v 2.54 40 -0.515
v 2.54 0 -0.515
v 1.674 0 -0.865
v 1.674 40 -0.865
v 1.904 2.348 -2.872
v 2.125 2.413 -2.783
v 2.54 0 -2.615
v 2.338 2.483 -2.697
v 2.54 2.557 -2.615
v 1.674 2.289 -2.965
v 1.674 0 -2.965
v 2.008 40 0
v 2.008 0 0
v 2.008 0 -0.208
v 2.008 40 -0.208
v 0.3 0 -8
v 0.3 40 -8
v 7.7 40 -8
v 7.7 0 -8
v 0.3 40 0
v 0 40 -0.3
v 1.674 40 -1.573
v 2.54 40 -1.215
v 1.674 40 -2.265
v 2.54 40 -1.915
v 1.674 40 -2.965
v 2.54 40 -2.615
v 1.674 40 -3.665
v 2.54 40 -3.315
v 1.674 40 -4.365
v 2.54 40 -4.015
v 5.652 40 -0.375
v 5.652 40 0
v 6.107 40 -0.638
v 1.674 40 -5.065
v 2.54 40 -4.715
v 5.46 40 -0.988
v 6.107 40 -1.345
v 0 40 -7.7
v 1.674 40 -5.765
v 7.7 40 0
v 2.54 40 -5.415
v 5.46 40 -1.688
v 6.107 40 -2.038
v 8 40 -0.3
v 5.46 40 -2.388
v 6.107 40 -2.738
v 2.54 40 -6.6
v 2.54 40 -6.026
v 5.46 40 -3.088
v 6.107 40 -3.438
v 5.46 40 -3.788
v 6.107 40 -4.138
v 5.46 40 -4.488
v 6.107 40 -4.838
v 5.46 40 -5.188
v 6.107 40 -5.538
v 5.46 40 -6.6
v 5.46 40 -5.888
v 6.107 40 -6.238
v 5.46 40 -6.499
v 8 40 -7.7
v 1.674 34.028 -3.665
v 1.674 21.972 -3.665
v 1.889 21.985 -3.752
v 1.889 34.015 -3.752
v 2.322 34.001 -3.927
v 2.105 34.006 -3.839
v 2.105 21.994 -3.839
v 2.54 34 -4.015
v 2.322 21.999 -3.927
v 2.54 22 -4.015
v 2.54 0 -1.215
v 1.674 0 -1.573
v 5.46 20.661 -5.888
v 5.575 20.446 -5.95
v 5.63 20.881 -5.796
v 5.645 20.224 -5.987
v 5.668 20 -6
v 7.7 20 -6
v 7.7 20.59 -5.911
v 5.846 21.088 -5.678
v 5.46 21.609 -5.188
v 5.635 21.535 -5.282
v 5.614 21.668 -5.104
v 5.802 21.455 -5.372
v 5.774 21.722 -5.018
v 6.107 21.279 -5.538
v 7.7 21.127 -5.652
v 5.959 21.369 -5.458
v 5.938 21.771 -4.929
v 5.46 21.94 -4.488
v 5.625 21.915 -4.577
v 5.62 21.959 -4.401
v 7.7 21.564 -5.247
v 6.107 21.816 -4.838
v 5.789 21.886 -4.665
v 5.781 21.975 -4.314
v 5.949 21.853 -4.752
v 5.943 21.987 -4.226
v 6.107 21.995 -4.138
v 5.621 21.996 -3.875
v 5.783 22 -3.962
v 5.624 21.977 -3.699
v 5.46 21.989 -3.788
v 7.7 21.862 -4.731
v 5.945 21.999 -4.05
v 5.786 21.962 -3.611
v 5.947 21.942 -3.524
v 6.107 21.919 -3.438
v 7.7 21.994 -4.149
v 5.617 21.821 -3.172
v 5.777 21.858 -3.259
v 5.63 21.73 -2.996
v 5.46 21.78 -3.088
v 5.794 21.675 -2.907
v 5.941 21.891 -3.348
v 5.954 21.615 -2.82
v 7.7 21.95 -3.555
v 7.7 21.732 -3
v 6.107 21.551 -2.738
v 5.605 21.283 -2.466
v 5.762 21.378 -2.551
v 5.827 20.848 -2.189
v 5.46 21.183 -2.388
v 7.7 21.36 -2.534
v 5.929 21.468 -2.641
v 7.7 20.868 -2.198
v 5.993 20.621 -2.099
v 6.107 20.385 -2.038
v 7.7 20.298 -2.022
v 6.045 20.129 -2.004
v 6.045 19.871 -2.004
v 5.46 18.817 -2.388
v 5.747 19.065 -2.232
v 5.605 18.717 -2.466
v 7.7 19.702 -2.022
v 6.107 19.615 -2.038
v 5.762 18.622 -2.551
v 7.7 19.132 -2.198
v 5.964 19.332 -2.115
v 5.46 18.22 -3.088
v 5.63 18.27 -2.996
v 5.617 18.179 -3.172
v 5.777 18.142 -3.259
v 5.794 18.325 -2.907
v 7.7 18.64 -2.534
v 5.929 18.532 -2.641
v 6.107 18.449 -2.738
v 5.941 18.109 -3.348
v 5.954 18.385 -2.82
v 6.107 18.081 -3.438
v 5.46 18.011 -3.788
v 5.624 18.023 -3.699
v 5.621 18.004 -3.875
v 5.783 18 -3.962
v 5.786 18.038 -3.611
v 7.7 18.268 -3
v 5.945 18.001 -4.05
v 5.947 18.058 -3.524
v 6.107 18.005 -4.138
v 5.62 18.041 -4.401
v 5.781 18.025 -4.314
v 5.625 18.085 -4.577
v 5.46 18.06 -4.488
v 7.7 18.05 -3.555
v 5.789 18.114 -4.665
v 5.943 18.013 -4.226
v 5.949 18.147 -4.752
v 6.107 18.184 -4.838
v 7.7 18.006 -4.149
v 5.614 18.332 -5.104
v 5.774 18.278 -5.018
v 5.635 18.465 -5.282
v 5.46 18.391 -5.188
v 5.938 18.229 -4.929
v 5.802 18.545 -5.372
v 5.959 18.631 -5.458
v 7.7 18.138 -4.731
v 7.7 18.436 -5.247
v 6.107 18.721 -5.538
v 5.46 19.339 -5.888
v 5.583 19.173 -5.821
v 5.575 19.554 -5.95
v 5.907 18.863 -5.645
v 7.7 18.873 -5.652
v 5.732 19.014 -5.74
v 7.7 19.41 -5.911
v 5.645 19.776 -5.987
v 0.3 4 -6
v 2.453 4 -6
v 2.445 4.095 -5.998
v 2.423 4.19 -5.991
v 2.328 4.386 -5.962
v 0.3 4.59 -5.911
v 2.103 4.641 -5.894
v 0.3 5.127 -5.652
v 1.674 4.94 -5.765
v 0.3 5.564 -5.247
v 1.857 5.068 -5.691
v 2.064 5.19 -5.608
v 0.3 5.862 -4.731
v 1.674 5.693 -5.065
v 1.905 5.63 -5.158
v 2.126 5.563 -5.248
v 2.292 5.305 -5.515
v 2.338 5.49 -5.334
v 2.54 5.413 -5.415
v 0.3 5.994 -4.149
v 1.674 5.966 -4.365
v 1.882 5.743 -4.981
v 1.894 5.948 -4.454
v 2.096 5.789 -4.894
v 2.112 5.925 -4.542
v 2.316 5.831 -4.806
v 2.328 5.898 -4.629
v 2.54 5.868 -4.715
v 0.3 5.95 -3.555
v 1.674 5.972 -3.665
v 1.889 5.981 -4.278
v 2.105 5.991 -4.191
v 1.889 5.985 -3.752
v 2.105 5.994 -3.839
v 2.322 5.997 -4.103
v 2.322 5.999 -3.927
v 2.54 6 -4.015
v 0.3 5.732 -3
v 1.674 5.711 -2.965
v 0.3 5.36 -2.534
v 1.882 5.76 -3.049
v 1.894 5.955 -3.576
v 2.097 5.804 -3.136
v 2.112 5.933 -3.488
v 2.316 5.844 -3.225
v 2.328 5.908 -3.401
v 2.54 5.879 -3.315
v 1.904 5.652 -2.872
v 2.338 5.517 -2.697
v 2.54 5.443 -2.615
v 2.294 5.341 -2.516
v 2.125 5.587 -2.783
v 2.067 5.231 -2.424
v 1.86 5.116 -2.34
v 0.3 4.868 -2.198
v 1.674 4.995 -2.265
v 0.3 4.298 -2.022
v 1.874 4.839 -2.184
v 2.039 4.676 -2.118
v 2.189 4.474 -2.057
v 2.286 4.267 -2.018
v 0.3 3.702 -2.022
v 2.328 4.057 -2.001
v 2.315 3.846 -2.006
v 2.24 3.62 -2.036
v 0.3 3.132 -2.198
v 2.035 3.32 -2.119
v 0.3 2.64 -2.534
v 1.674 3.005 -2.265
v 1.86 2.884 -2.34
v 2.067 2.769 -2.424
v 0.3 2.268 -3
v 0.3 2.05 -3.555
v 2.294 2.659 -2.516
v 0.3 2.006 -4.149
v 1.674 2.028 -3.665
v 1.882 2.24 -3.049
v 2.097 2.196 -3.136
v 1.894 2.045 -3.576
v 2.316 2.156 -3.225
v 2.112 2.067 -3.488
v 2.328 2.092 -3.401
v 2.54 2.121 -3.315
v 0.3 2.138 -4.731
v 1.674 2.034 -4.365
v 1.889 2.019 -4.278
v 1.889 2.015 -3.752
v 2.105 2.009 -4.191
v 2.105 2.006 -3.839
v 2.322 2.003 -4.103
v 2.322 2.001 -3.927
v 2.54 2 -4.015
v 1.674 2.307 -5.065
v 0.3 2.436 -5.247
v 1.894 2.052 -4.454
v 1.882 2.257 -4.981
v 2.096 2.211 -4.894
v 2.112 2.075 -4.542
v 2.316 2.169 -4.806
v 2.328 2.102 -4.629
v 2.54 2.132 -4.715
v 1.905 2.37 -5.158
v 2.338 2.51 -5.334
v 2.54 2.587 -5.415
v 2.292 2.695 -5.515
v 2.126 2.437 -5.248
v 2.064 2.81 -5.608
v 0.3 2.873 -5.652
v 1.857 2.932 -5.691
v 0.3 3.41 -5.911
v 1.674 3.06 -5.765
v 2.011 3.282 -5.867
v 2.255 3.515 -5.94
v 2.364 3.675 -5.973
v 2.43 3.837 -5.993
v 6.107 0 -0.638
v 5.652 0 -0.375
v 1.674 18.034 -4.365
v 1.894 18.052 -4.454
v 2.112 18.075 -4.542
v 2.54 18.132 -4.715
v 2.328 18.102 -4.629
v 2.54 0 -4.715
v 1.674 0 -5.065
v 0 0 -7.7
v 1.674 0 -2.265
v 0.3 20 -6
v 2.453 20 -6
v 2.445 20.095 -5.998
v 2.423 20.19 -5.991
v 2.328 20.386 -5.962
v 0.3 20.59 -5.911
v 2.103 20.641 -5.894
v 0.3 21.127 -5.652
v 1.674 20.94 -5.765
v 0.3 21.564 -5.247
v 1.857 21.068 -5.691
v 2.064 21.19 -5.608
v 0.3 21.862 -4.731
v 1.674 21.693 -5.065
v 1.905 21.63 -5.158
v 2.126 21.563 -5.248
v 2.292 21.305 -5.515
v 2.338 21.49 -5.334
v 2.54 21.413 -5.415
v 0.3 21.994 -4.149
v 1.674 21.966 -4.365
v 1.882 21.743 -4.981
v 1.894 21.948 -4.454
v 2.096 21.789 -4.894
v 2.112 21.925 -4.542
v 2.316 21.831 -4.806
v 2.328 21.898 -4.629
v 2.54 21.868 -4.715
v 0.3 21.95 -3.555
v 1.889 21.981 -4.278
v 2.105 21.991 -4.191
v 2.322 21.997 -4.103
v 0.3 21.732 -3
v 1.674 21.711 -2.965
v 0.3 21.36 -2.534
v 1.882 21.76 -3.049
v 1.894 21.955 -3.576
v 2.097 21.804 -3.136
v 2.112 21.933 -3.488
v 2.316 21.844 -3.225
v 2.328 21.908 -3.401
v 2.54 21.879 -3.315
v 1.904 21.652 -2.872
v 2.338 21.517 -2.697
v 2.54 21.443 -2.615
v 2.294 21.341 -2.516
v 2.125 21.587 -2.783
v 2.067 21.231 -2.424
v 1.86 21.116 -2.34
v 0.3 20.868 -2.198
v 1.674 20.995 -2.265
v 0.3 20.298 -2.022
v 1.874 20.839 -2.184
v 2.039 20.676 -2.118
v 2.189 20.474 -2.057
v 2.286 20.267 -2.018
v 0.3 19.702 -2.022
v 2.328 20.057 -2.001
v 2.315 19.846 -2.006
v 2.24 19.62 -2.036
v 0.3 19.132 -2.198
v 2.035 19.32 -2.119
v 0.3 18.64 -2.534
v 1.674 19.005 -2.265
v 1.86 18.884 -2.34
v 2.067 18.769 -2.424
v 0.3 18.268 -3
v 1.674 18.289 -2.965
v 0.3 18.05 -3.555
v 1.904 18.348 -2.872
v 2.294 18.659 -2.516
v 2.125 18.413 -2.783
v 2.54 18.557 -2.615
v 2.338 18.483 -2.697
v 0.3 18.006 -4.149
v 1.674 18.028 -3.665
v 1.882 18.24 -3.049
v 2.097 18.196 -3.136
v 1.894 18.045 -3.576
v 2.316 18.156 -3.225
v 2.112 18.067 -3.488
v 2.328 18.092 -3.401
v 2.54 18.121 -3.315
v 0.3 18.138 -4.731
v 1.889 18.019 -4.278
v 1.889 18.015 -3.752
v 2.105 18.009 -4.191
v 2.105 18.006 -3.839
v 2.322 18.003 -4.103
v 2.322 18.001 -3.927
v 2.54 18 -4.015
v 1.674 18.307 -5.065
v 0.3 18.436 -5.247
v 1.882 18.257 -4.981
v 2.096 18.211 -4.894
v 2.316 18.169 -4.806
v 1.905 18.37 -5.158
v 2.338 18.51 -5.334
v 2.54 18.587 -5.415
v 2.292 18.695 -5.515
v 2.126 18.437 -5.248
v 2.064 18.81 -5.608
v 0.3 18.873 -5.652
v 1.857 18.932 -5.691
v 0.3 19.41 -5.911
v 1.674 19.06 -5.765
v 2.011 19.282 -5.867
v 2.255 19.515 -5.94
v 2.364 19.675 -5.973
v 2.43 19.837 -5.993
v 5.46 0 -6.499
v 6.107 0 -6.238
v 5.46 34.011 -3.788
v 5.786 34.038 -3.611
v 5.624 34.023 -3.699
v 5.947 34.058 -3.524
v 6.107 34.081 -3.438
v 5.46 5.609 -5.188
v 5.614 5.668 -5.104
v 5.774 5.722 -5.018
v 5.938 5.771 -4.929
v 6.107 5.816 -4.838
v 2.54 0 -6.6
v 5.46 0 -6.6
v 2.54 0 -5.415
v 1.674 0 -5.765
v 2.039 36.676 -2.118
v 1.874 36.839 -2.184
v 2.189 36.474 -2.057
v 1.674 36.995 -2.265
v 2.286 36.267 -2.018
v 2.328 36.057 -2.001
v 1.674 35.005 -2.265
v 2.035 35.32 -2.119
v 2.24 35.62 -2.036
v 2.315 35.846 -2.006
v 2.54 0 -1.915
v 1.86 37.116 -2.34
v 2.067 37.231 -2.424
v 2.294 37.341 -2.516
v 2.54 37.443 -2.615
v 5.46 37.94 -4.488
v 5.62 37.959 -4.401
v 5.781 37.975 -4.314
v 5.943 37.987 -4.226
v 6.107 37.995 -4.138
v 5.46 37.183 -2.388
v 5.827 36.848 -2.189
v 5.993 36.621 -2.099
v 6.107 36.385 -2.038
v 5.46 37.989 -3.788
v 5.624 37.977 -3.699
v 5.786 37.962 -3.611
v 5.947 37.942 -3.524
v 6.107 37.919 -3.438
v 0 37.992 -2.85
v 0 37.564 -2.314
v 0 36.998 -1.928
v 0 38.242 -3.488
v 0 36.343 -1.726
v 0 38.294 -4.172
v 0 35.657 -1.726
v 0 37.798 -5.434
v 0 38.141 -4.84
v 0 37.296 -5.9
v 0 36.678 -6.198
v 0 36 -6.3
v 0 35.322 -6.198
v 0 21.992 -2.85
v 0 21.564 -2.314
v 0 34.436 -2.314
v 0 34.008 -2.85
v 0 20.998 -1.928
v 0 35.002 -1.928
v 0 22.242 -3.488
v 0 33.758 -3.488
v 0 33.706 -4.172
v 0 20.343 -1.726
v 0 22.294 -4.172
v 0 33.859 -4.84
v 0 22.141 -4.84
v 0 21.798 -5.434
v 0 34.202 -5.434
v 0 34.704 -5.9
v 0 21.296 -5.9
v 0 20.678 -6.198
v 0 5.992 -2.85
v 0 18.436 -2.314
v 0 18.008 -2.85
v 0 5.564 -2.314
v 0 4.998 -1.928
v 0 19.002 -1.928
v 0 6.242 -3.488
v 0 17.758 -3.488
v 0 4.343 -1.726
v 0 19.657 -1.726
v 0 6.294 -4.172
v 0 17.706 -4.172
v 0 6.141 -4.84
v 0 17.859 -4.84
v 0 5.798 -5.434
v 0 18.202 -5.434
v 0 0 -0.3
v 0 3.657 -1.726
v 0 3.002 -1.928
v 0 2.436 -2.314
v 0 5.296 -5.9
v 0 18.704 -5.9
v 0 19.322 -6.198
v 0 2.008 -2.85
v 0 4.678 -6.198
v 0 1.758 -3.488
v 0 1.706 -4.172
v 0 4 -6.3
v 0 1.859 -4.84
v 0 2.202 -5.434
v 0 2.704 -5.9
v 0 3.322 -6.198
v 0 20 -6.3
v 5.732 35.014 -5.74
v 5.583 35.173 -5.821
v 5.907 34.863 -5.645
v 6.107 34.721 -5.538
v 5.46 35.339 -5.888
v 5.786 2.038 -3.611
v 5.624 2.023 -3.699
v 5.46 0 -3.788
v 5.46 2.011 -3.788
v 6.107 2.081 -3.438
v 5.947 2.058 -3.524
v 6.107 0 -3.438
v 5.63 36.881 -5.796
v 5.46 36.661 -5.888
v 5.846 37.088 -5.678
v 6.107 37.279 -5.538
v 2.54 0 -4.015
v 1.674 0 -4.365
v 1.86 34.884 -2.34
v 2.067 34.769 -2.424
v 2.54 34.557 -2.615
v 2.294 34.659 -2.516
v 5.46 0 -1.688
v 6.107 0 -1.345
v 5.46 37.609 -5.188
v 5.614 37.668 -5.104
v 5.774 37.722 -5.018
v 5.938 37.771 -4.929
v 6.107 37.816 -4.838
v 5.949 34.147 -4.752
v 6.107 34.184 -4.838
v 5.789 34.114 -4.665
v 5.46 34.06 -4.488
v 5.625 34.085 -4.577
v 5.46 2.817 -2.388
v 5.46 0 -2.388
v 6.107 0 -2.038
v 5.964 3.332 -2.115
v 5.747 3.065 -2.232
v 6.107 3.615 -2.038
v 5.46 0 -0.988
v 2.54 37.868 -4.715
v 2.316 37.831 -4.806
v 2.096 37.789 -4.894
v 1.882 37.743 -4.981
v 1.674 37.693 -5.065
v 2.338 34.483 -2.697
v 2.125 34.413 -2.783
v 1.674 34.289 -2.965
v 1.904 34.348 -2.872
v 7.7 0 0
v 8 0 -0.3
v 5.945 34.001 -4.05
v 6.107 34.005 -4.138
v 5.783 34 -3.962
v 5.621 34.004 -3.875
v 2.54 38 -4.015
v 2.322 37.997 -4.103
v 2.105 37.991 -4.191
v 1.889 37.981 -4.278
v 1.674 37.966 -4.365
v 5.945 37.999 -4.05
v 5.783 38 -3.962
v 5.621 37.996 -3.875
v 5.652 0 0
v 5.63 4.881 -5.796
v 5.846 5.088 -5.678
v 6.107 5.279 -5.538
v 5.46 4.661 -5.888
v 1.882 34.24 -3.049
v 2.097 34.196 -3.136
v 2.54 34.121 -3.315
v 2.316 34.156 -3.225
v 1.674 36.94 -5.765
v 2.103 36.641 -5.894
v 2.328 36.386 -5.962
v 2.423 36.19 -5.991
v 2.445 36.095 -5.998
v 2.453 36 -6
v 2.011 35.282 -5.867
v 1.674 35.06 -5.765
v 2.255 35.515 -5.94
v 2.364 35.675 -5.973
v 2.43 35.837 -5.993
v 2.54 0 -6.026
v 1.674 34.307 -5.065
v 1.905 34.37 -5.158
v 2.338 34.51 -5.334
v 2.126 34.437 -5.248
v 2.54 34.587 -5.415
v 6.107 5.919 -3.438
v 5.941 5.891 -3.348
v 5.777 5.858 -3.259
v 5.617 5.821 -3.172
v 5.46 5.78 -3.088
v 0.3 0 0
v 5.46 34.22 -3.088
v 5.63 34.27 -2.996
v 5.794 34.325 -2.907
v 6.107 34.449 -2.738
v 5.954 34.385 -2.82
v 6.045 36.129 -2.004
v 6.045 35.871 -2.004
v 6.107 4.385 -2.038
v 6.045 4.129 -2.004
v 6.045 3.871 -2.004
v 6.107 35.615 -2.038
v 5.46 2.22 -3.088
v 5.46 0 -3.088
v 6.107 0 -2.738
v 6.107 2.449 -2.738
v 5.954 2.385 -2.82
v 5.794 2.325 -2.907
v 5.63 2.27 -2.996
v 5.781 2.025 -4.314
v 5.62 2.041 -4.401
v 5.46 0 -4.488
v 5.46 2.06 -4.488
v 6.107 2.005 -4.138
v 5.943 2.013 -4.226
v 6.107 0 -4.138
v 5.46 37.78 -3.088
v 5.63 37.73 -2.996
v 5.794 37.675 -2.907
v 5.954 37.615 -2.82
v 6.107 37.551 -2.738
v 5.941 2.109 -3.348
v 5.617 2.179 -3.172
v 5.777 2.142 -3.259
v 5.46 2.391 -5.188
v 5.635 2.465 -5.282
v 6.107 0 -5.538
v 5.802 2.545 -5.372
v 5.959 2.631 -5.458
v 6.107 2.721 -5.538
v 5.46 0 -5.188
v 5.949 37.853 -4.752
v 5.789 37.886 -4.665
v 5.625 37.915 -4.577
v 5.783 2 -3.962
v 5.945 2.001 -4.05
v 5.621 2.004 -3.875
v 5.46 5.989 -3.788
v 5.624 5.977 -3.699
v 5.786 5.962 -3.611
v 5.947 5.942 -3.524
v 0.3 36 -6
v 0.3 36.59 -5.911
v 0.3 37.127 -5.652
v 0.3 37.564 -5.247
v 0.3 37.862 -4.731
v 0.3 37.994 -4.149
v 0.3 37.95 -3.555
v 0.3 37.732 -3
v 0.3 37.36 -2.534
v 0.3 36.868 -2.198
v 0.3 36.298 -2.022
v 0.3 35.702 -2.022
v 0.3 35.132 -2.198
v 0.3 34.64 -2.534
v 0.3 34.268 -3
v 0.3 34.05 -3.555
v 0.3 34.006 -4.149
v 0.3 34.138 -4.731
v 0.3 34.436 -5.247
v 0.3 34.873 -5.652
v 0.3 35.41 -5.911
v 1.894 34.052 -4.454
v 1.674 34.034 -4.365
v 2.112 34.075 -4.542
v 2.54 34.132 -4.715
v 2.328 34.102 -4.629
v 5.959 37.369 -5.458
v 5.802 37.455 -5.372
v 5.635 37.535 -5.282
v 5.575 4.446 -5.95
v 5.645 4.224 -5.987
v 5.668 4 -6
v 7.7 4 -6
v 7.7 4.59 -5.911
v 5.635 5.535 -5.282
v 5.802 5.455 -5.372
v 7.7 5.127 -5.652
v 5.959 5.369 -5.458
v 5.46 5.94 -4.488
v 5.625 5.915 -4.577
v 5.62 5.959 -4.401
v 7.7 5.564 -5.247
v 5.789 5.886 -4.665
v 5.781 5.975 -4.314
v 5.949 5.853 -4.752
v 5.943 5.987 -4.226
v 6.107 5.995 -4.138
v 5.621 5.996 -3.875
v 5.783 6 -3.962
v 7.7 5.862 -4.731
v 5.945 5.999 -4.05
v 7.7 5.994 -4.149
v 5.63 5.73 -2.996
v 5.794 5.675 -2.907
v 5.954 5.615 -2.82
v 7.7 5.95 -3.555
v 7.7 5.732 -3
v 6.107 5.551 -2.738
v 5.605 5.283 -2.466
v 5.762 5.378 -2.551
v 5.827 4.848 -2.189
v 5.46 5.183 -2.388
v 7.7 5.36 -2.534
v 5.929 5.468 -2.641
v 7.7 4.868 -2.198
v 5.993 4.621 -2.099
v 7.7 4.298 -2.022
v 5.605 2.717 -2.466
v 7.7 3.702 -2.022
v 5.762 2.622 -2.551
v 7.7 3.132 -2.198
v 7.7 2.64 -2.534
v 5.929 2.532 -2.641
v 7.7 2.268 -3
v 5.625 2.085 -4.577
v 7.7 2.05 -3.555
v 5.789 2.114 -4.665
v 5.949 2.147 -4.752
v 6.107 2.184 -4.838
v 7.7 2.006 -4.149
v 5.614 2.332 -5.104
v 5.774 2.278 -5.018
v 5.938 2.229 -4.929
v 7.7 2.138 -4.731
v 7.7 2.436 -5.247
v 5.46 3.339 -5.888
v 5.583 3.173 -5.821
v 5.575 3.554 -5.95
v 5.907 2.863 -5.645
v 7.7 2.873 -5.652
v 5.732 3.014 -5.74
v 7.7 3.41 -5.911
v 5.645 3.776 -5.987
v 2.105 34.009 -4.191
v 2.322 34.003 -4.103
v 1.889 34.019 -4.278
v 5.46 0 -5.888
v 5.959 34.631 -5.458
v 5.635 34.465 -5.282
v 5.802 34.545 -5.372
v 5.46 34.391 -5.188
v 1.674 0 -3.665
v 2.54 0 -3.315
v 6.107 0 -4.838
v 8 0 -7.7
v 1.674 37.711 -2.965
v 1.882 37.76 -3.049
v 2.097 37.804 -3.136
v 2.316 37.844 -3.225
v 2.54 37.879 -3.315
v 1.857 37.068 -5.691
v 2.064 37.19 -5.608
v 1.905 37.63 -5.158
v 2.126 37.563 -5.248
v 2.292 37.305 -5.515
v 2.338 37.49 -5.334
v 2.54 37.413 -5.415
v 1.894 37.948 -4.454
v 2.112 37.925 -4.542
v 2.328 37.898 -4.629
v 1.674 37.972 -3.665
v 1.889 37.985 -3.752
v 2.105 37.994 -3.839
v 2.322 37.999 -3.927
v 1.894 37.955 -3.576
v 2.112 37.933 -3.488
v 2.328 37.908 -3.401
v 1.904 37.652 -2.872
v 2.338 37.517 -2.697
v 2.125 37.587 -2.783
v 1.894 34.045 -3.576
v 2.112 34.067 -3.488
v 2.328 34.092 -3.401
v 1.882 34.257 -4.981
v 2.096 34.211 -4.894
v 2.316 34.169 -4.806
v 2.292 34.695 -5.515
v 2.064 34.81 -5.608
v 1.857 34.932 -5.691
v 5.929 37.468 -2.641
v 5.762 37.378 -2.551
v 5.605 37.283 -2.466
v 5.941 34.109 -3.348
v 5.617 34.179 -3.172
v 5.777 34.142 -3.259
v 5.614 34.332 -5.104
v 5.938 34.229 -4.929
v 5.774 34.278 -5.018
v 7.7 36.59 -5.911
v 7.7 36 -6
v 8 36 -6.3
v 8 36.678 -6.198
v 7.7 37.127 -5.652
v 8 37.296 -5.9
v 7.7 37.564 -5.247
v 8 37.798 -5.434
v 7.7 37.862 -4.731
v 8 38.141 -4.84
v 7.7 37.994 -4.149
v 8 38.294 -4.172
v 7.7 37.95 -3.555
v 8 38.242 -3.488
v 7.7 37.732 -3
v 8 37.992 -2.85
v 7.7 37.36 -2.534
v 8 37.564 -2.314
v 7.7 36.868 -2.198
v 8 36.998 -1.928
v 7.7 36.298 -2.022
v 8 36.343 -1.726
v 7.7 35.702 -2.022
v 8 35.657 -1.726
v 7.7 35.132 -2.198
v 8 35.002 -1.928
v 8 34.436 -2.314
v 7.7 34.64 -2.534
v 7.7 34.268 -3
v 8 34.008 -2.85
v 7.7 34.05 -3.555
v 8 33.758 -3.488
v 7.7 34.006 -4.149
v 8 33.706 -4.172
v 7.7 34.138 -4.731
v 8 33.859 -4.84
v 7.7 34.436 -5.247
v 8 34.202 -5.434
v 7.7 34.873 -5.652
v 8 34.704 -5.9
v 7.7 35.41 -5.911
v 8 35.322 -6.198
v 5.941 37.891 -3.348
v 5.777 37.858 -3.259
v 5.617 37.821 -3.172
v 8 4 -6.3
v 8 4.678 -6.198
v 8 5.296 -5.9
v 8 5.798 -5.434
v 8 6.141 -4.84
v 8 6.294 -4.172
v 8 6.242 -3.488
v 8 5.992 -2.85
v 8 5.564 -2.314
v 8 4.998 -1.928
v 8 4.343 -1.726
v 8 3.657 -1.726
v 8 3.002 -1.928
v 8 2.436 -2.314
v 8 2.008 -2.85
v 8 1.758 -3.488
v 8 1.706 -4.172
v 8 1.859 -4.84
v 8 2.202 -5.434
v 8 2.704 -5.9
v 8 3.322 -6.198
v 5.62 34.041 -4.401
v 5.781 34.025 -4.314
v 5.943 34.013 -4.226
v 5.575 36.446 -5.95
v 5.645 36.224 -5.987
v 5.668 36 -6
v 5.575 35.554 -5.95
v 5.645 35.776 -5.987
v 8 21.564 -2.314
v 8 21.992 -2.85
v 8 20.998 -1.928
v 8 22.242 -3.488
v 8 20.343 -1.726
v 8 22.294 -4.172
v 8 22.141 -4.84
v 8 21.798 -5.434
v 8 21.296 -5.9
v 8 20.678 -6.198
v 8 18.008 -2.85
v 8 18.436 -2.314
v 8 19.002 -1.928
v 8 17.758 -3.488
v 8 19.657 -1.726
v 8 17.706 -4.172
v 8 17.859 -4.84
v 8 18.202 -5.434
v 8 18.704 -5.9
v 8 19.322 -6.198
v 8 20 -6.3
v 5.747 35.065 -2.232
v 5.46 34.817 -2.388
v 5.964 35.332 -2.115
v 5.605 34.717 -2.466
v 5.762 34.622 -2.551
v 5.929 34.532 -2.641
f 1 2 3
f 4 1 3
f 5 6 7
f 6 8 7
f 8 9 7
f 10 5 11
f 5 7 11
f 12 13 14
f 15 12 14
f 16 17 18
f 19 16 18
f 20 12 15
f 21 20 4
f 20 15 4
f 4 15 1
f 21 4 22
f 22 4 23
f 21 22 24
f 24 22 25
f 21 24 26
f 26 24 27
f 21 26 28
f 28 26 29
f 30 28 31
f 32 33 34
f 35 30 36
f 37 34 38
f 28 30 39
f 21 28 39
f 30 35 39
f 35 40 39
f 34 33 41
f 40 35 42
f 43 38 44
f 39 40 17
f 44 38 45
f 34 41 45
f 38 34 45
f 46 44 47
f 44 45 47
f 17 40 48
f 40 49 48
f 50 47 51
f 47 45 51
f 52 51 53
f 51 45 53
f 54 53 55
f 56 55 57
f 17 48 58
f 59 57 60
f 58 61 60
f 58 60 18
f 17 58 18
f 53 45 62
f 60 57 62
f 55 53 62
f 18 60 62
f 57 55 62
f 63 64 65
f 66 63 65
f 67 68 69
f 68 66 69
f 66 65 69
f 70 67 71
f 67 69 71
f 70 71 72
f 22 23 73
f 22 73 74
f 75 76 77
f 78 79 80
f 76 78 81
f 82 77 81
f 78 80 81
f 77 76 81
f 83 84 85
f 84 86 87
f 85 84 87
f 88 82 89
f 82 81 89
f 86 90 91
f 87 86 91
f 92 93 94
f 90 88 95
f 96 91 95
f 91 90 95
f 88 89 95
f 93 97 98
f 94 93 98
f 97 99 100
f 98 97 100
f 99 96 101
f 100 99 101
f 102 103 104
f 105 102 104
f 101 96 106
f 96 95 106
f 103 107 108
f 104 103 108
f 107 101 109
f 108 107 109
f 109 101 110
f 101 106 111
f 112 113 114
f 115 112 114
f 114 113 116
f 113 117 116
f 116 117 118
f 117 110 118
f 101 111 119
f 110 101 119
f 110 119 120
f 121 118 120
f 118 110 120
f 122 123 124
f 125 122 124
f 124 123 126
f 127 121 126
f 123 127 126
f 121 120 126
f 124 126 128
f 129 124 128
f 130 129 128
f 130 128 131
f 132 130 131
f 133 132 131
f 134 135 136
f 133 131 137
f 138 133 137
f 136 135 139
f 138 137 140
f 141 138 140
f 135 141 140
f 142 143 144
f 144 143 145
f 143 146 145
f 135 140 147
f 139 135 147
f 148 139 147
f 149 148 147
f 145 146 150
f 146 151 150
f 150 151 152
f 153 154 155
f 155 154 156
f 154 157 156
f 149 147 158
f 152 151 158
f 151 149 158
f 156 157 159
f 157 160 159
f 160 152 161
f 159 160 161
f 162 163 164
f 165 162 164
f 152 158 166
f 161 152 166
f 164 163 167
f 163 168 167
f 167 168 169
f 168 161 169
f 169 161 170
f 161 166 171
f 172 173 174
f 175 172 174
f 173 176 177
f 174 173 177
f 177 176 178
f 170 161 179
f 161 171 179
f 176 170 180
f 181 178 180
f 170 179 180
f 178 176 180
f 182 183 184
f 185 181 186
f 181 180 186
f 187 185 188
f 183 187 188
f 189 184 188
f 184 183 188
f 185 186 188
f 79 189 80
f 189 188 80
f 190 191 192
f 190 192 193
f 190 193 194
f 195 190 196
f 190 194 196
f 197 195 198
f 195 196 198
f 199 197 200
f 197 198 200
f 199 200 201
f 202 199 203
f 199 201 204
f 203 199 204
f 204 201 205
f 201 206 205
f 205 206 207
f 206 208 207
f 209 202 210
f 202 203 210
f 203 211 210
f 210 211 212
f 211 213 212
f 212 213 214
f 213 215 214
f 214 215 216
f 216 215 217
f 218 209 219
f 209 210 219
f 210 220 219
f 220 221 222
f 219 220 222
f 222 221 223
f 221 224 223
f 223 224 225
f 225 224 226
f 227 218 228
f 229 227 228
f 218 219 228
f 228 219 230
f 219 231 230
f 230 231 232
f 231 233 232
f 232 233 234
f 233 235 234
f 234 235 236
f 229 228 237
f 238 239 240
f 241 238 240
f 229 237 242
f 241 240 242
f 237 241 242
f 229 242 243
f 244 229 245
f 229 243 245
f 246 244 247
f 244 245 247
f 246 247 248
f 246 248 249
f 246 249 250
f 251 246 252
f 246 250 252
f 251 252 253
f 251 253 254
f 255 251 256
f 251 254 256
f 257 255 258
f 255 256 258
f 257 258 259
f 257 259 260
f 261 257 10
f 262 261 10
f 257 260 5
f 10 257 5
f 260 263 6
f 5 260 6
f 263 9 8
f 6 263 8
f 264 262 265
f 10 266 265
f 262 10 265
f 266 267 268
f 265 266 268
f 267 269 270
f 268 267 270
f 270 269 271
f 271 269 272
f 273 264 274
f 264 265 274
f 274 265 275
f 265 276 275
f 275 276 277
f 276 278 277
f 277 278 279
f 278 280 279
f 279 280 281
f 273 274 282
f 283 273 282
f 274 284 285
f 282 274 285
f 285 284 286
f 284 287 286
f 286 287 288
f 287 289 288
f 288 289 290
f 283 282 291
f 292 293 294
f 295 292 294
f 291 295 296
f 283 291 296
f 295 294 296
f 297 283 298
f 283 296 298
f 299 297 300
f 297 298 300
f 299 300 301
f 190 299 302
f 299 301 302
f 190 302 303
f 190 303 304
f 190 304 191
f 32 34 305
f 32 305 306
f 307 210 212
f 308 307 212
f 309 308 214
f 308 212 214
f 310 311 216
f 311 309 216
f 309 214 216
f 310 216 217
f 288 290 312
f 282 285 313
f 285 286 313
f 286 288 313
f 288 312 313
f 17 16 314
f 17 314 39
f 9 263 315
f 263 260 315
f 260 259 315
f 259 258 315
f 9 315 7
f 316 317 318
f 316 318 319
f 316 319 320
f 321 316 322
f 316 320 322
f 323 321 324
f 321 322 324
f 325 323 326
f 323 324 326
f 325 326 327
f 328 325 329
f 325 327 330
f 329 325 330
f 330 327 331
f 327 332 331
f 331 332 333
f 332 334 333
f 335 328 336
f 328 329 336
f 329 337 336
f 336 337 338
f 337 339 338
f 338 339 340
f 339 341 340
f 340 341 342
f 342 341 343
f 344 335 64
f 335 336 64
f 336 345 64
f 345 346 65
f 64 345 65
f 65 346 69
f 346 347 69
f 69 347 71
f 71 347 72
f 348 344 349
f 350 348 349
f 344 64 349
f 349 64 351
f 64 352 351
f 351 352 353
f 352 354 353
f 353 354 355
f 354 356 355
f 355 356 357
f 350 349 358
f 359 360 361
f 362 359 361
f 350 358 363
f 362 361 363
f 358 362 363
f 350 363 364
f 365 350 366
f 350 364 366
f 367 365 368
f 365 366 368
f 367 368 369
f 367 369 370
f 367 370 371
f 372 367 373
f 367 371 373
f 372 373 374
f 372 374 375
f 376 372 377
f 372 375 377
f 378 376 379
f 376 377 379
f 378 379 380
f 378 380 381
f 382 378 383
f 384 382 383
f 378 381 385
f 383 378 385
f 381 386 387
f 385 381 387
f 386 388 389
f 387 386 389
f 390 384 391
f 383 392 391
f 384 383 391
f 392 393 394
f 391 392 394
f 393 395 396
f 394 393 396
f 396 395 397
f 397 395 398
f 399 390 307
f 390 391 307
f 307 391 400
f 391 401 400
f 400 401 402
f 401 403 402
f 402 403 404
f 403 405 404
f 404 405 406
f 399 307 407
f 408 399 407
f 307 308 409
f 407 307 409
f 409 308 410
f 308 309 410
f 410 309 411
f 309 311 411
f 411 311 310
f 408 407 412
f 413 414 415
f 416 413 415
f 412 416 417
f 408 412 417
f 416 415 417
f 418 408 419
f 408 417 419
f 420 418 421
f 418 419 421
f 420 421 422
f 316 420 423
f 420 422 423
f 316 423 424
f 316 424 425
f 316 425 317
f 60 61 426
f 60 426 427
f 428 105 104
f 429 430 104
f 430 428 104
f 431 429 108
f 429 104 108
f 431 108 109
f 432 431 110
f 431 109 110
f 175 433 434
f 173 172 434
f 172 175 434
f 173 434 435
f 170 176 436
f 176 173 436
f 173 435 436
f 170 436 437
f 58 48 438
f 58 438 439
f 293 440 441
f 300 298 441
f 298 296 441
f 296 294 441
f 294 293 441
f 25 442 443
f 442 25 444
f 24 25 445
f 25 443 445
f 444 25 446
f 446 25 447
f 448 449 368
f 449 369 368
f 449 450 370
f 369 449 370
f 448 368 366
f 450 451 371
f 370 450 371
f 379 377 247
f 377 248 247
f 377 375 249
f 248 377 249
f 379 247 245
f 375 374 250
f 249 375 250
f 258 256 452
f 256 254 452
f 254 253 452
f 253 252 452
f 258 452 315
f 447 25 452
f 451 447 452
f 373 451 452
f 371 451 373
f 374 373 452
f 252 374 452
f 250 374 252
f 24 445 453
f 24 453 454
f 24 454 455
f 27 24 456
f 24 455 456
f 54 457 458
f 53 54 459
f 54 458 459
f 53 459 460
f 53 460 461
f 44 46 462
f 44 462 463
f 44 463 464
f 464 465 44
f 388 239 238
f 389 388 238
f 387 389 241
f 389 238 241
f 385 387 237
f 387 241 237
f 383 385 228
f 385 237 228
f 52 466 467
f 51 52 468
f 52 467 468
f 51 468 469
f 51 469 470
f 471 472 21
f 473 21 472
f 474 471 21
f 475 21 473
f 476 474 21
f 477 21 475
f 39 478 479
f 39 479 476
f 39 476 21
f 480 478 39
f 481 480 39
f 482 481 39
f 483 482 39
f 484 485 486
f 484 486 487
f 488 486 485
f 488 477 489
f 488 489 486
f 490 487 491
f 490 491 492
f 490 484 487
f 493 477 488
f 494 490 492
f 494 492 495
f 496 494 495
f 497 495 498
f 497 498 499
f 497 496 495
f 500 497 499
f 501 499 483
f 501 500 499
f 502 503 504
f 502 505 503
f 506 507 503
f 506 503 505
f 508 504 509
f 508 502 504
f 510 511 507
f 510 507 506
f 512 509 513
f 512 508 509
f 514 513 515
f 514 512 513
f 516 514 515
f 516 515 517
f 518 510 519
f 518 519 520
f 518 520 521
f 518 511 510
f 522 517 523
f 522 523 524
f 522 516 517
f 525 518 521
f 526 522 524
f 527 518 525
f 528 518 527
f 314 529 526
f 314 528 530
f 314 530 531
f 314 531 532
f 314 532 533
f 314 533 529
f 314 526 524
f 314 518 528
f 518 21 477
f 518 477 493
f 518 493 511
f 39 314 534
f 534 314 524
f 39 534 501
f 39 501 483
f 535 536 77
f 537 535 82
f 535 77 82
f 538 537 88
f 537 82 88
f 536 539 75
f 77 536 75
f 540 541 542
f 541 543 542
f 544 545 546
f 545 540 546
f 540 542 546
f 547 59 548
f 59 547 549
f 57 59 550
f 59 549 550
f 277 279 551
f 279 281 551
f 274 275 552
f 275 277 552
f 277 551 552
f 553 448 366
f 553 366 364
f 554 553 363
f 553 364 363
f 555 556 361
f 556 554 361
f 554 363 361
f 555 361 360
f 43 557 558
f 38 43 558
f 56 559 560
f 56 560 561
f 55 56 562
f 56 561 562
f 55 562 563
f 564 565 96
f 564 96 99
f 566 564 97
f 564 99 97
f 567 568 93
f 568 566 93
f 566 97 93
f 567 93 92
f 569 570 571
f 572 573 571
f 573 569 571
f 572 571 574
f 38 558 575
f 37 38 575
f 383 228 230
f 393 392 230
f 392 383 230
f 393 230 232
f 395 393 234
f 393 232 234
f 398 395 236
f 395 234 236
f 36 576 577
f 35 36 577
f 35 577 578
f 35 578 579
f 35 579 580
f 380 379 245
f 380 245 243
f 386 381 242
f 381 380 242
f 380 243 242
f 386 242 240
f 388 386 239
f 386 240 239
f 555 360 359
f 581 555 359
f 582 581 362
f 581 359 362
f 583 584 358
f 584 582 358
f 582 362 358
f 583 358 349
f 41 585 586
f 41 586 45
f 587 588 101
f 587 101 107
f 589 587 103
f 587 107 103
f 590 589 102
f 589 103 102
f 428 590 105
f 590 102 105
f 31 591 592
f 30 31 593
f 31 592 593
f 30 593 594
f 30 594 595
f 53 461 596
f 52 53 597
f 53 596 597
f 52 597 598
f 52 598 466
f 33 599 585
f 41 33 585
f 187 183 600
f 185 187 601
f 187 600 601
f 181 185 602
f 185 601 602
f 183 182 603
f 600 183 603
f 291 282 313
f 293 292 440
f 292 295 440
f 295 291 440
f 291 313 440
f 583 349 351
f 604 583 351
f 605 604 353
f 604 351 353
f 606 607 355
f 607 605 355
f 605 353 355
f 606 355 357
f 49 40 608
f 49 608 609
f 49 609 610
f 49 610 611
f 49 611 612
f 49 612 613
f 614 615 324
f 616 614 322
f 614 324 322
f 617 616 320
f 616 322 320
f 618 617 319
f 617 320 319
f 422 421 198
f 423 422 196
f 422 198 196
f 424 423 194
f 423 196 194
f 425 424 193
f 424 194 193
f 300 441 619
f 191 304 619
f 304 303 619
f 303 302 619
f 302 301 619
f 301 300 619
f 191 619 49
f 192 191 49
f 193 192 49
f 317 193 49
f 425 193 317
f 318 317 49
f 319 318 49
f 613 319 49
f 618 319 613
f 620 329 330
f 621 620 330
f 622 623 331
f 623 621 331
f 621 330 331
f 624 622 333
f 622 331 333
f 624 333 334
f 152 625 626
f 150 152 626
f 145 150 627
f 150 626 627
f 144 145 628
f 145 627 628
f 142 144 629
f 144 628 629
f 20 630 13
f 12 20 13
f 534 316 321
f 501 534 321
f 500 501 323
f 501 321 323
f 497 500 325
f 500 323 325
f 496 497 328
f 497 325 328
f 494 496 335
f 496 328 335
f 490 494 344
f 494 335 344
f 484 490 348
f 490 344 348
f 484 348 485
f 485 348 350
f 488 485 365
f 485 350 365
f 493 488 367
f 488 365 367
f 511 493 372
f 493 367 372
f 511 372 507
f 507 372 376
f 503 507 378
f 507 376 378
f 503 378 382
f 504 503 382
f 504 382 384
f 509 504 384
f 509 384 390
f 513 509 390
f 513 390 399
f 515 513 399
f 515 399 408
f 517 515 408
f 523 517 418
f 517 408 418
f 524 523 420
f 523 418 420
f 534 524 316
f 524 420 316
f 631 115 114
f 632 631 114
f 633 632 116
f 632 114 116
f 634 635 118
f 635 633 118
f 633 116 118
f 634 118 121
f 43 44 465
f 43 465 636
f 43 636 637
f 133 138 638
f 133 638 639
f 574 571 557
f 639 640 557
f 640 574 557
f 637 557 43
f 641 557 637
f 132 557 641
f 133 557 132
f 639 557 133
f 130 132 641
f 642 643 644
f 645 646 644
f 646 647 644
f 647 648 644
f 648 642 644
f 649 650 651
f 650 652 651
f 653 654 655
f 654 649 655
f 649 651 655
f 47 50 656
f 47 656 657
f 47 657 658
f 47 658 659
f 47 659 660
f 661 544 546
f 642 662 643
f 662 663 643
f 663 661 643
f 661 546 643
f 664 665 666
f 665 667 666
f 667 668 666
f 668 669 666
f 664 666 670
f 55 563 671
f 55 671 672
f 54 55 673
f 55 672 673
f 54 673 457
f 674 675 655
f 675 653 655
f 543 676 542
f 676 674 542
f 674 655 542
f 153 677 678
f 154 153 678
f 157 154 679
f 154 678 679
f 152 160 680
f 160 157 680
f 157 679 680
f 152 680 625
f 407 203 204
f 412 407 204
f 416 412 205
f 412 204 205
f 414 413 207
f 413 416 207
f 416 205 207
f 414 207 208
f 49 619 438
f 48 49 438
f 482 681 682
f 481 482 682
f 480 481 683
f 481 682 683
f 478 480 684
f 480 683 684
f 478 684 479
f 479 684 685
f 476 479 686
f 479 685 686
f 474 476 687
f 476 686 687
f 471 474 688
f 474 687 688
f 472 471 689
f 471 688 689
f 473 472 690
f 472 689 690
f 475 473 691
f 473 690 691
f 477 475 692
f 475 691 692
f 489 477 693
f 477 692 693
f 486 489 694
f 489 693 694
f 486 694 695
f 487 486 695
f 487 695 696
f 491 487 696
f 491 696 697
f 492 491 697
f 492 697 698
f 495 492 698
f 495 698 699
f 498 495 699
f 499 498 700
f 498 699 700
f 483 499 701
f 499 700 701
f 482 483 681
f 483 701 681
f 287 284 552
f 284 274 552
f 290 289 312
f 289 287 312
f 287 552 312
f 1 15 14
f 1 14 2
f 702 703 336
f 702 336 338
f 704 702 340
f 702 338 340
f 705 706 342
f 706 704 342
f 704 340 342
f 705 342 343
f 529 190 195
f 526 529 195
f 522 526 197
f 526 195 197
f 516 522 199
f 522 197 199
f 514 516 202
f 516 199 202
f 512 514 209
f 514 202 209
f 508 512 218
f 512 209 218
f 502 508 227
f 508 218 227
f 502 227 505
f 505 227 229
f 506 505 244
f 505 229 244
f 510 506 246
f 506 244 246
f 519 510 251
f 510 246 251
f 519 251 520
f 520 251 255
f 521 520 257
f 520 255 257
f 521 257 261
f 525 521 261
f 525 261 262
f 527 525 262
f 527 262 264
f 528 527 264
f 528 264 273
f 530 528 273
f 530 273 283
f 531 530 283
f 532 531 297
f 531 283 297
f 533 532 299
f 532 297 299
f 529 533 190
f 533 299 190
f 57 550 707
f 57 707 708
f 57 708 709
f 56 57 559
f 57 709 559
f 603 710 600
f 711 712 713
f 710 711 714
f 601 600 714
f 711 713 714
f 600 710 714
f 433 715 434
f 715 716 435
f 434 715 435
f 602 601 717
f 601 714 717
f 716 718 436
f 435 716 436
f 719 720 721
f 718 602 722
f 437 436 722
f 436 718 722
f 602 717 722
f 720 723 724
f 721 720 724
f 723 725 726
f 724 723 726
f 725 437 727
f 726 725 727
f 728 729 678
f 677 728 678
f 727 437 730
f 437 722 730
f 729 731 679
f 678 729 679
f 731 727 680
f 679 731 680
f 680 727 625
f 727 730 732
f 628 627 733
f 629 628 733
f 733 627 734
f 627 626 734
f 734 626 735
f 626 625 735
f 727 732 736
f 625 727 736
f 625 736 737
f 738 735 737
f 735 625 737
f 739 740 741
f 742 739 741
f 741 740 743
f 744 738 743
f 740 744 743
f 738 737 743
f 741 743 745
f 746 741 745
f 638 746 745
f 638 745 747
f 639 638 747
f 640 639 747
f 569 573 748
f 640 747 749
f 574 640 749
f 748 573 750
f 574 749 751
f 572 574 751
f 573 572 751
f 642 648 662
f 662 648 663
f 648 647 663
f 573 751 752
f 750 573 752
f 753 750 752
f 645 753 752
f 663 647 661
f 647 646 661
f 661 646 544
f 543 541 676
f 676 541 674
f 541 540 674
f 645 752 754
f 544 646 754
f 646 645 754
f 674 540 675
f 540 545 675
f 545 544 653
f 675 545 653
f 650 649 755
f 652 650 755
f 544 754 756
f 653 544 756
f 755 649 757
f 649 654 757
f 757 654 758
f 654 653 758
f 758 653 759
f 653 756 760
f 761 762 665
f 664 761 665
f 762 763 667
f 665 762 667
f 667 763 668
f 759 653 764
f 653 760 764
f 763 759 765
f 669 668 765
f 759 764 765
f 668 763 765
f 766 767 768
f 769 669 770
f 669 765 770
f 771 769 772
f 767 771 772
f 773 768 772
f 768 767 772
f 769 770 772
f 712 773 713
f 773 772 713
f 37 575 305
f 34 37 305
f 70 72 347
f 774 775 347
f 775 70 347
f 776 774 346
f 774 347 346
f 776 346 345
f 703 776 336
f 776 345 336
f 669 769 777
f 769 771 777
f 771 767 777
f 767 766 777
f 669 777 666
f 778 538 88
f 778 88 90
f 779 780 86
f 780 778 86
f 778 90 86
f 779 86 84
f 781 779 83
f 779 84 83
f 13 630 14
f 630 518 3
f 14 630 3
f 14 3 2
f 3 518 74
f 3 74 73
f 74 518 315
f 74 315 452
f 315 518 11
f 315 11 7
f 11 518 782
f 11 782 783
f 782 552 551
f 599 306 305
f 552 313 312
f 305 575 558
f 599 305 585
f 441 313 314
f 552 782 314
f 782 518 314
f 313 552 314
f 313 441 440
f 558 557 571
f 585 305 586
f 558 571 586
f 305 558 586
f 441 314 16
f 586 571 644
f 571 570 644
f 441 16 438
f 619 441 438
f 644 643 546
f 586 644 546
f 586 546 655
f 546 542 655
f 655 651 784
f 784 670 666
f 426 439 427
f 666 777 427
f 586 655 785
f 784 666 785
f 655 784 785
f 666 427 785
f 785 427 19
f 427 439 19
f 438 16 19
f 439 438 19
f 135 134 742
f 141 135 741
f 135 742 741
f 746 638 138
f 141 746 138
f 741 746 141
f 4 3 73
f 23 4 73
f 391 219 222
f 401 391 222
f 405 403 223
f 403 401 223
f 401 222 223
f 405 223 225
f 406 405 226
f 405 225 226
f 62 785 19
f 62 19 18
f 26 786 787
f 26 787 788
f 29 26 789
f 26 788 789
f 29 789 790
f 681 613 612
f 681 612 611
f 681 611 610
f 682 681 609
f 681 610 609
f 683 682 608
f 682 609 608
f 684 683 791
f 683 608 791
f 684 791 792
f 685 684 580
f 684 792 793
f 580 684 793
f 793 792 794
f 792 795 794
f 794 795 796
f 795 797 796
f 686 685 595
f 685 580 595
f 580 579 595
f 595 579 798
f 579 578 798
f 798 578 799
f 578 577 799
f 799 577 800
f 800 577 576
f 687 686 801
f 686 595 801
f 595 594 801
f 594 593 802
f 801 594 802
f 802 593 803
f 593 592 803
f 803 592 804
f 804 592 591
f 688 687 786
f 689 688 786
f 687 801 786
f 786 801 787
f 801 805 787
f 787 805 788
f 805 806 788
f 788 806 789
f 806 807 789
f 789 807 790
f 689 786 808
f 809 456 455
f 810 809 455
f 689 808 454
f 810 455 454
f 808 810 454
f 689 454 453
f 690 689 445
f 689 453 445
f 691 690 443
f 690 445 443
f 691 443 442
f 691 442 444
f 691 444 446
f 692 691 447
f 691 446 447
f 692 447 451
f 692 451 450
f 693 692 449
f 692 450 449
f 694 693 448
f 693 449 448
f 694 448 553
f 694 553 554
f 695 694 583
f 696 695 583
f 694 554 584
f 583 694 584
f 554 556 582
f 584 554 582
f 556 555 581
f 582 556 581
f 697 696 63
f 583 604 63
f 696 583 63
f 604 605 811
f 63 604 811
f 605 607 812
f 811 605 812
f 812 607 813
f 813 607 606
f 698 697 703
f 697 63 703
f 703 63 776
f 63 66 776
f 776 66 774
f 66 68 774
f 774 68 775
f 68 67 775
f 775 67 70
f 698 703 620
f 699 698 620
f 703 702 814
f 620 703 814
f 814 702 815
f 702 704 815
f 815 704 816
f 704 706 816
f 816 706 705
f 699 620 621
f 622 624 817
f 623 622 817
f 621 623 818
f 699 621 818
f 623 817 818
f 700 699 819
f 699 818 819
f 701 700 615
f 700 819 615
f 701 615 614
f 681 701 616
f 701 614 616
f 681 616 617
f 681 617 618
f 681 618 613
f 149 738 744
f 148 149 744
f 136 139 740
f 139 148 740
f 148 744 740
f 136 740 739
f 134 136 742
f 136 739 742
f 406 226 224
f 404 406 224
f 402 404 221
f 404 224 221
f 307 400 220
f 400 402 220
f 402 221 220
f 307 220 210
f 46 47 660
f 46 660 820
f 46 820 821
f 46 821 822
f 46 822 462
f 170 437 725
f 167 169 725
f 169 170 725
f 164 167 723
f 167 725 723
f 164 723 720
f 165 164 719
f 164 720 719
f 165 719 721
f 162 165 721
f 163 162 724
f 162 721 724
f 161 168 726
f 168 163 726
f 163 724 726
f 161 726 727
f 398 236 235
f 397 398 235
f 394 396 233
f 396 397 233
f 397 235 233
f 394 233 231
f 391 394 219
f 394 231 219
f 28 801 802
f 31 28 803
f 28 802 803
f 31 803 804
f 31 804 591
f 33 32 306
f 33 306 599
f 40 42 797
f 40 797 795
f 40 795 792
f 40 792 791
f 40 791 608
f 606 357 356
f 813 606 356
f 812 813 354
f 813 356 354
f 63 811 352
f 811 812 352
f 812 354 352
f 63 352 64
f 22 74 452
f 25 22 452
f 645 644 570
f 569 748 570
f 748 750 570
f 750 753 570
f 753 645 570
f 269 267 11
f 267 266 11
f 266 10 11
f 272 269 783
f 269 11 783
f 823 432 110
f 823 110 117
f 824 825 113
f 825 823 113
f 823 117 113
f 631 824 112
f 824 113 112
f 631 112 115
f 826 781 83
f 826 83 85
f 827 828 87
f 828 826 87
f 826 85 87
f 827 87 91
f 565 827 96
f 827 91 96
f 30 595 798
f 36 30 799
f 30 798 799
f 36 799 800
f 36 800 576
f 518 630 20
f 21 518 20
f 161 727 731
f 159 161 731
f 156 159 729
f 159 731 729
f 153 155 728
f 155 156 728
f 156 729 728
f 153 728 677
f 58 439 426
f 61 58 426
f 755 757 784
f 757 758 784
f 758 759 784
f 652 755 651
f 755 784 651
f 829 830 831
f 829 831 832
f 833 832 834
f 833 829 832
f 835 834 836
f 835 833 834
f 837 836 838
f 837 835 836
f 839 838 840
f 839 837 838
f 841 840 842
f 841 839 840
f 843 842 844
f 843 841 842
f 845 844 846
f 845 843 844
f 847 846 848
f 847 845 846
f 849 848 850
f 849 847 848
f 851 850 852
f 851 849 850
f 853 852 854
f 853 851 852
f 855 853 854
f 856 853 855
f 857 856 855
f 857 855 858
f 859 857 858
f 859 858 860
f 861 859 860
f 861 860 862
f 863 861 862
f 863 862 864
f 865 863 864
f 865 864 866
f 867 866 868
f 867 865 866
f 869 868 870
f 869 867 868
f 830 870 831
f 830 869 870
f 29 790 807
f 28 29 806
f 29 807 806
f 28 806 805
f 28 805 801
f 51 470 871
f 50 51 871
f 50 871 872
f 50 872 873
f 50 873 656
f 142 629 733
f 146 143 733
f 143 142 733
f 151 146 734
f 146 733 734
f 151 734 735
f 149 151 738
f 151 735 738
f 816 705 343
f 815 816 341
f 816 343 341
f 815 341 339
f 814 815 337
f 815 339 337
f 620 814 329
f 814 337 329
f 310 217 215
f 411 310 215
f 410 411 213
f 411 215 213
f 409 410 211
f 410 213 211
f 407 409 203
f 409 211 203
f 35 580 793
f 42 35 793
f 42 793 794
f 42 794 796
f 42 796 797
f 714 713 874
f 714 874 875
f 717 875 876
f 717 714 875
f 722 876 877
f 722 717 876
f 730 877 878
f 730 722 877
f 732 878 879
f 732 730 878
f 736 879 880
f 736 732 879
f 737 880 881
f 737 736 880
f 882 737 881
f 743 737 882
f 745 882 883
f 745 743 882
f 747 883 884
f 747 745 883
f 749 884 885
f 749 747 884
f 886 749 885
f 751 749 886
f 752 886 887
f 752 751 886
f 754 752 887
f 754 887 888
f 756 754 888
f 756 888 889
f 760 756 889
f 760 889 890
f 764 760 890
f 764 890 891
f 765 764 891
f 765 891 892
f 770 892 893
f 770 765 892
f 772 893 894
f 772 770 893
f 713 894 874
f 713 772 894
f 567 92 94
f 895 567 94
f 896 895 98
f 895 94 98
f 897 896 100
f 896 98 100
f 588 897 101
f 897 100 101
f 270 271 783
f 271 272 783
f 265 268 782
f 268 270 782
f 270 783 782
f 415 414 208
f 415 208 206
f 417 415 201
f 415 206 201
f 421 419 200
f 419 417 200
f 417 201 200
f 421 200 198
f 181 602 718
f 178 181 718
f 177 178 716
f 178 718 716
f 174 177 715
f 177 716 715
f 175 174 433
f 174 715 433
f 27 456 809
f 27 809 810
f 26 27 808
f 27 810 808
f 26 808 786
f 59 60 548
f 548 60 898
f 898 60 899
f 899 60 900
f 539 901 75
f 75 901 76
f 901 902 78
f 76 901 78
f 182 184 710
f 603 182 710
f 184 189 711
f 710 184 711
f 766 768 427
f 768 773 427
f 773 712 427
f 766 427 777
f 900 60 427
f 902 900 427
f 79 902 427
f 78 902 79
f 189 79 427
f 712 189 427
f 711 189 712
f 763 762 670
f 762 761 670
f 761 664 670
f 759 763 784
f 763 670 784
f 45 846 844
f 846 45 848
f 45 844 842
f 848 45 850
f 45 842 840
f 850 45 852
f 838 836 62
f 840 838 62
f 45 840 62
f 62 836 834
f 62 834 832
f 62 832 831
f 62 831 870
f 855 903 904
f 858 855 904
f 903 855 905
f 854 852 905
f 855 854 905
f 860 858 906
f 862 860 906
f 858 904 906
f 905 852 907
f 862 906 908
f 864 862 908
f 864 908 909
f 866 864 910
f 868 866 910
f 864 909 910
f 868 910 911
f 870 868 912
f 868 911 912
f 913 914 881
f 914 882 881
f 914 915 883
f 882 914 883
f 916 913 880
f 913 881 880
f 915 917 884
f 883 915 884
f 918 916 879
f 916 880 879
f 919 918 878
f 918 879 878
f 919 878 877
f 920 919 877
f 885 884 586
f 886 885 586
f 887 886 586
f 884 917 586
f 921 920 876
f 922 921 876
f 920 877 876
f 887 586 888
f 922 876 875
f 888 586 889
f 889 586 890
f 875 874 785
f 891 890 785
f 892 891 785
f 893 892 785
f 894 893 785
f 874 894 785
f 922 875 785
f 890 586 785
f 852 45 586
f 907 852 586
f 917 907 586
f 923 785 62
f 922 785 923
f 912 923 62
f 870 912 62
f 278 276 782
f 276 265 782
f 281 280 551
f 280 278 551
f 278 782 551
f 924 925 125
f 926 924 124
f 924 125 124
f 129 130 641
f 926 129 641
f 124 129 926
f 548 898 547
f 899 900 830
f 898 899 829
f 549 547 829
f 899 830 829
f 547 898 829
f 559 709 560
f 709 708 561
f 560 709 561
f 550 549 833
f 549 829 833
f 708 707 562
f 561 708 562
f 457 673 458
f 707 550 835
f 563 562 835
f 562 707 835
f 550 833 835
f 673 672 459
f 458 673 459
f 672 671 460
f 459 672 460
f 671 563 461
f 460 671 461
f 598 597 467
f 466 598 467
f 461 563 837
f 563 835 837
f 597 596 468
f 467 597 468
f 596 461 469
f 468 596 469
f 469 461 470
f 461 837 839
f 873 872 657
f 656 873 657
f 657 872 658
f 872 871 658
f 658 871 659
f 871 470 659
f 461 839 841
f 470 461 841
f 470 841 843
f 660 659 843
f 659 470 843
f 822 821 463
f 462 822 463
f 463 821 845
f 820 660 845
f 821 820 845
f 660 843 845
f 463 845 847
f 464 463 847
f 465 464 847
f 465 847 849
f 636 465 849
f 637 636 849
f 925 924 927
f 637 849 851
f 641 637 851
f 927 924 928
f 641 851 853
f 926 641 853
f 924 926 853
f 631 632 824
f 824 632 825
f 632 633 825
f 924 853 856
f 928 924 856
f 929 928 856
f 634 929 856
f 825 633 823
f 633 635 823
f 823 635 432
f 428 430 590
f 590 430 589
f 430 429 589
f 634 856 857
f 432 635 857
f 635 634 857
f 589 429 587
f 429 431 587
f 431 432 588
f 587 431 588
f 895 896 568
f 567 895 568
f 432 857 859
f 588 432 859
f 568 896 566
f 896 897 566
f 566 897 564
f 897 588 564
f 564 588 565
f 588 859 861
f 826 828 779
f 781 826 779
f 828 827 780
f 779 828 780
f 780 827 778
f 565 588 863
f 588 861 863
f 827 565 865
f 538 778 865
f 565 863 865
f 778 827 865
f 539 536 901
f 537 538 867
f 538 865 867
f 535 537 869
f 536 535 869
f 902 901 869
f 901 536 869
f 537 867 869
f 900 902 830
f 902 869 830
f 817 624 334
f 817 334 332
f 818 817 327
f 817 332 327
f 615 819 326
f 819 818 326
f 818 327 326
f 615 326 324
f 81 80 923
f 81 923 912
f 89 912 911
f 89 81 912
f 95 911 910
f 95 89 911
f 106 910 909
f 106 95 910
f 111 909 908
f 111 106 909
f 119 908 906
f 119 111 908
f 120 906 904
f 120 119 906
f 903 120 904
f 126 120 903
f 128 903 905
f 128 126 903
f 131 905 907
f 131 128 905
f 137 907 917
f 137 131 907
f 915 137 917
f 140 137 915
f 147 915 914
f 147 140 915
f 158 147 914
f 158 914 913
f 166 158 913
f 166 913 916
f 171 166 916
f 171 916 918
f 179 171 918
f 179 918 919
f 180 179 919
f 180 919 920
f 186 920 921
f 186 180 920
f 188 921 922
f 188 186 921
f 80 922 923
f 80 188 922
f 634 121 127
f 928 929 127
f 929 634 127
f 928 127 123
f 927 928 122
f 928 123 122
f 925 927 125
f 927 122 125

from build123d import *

# Parameters (mm, degrees)
SKETCH1_W                  = 8
SKETCH1_H                  = 8
BOSS_EXTRUDE1_DEPTH        = 300
CUT_EXTRUDE1_DEPTH         = 301.213257535
SKETCH3_R                  = 2
CUT_EXTRUDE2_DEPTH         = 301.213257535
CHAMFER1_SIZE              = 0.3
CHAMFER2_SIZE              = 0.3
LPATTERN1_COUNT            = 19
LPATTERN1_PITCH            = 16
CHAMFER1_OF_LPATTERN1_SIZE = 0.3
SKETCH4_W                  = 8
SKETCH4_H                  = 260
CUT_EXTRUDE3_DEPTH         = 301.213257535


with BuildPart() as part:
    # Sketch1 → Boss-Extrude1 (new body)
    with BuildSketch(Plane(origin=(0, 0, 0), x_dir=(1, 0, 0), z_dir=(0, 1, 0))):
        with Locations((4, 4)):
            Rectangle(SKETCH1_W, SKETCH1_H)
    extrude(amount=BOSS_EXTRUDE1_DEPTH)

    # Sketch2 → Cut-Extrude1 (cut, through all)
    with BuildSketch(Plane.XZ):
        Polygon((5.652029979, 0), (2.008445554, 0), (2.008445554, -0.208206305), (2.54, -0.515099407), (1.673719601, -0.865099407), (2.54, -1.215099407), (1.673719601, -1.572712655), (2.54, -1.915099407), (1.673719601, -2.265099407), (2.54, -2.615099407), (1.673719601, -2.965099407), (2.54, -3.315099407), (1.673719601, -3.665099407), (2.54, -4.015099407), (1.673719601, -4.365099407), (2.54, -4.715099407), (1.673719601, -5.065099407), (2.54, -5.415099407), (1.673719601, -5.765099407), (2.54, -6.026380467), (2.54, -6.6), (5.46, -6.6), (5.46, -6.49878106), (6.106693316, -6.2375), (5.46, -5.8875), (6.106693316, -5.5375), (5.46, -5.1875), (6.106693316, -4.8375), (5.46, -4.4875), (6.106693316, -4.1375), (5.46, -3.7875), (6.106693316, -3.4375), (5.46, -3.0875), (6.106693316, -2.7375), (5.46, -2.3875), (6.106693316, -2.0375), (5.46, -1.6875), (6.106693316, -1.345113247), (5.46, -0.9875), (6.106693316, -0.6375), (5.652029979, -0.375), align=None)
    extrude(amount=-CUT_EXTRUDE1_DEPTH, mode=Mode.SUBTRACT)

    # Sketch3 → Cut-Extrude2 (cut, through all)
    with BuildSketch(Plane(origin=(8, 0, 0), x_dir=(0, 0, -1), z_dir=(1, 0, 0))):
        with Locations((4, 4)):
            Circle(SKETCH3_R)
    cut_extrude2 = extrude(amount=-CUT_EXTRUDE2_DEPTH, mode=Mode.SUBTRACT)

    # Chamfer1
    chamfer1_edges = [part.edges().sort_by_distance(p)[0] for p in [
        (0, 4, -2),
        (8, 4, -2),
    ]]
    chamfer(chamfer1_edges, length=CHAMFER1_SIZE)

    # Chamfer2
    chamfer2_edges = [part.edges().sort_by_distance(p)[0] for p in [
        (0, 150, -8),
        (8, 150, -8),
        (8, 150, 0),
        (0, 150, 0),
    ]]
    chamfer(chamfer2_edges, length=CHAMFER2_SIZE)

    # LPattern1: Cut-Extrude2 ×19
    with Locations(*[(0, i * LPATTERN1_PITCH, 0) for i in range(1, LPATTERN1_COUNT)]):
        add(cut_extrude2, mode=Mode.SUBTRACT)

    # Chamfer1 of LPattern1
    chamfer1_of_lpattern1_edges = [part.edges().sort_by_distance(p)[0] for p in [
        (0, 20, -2),
        (8, 20, -2),
        (0, 36, -2),
        (8, 36, -2),
        (0, 52, -2),
        (8, 52, -2),
        (0, 68, -2),
        (8, 68, -2),
        (0, 84, -2),
        (8, 84, -2),
        (0, 100, -2),
        (8, 100, -2),
        (0, 116, -2),
        (8, 116, -2),
        (0, 132, -2),
        (8, 132, -2),
        (0, 148, -2),
        (8, 148, -2),
        (0, 164, -2),
        (8, 164, -2),
        (0, 180, -2),
        (8, 180, -2),
        (0, 196, -2),
        (8, 196, -2),
        (0, 212, -2),
        (8, 212, -2),
        (0, 228, -2),
        (8, 228, -2),
        (0, 244, -2),
        (8, 244, -2),
        (0, 260, -2),
        (8, 260, -2),
        (0, 276, -2),
        (8, 276, -2),
        (0, 292, -2),
        (8, 292, -2),
    ]]
    chamfer(chamfer1_of_lpattern1_edges, length=CHAMFER1_OF_LPATTERN1_SIZE)

    # Sketch4 → Cut-Extrude3 (cut, through all)
    with BuildSketch(Plane(origin=(8, 0, 0), x_dir=(0, 0, -1), z_dir=(1, 0, 0))):
        with Locations((4, 170)):
            Rectangle(SKETCH4_W, SKETCH4_H)
    extrude(amount=-CUT_EXTRUDE3_DEPTH, mode=Mode.SUBTRACT)


solid = part.part
